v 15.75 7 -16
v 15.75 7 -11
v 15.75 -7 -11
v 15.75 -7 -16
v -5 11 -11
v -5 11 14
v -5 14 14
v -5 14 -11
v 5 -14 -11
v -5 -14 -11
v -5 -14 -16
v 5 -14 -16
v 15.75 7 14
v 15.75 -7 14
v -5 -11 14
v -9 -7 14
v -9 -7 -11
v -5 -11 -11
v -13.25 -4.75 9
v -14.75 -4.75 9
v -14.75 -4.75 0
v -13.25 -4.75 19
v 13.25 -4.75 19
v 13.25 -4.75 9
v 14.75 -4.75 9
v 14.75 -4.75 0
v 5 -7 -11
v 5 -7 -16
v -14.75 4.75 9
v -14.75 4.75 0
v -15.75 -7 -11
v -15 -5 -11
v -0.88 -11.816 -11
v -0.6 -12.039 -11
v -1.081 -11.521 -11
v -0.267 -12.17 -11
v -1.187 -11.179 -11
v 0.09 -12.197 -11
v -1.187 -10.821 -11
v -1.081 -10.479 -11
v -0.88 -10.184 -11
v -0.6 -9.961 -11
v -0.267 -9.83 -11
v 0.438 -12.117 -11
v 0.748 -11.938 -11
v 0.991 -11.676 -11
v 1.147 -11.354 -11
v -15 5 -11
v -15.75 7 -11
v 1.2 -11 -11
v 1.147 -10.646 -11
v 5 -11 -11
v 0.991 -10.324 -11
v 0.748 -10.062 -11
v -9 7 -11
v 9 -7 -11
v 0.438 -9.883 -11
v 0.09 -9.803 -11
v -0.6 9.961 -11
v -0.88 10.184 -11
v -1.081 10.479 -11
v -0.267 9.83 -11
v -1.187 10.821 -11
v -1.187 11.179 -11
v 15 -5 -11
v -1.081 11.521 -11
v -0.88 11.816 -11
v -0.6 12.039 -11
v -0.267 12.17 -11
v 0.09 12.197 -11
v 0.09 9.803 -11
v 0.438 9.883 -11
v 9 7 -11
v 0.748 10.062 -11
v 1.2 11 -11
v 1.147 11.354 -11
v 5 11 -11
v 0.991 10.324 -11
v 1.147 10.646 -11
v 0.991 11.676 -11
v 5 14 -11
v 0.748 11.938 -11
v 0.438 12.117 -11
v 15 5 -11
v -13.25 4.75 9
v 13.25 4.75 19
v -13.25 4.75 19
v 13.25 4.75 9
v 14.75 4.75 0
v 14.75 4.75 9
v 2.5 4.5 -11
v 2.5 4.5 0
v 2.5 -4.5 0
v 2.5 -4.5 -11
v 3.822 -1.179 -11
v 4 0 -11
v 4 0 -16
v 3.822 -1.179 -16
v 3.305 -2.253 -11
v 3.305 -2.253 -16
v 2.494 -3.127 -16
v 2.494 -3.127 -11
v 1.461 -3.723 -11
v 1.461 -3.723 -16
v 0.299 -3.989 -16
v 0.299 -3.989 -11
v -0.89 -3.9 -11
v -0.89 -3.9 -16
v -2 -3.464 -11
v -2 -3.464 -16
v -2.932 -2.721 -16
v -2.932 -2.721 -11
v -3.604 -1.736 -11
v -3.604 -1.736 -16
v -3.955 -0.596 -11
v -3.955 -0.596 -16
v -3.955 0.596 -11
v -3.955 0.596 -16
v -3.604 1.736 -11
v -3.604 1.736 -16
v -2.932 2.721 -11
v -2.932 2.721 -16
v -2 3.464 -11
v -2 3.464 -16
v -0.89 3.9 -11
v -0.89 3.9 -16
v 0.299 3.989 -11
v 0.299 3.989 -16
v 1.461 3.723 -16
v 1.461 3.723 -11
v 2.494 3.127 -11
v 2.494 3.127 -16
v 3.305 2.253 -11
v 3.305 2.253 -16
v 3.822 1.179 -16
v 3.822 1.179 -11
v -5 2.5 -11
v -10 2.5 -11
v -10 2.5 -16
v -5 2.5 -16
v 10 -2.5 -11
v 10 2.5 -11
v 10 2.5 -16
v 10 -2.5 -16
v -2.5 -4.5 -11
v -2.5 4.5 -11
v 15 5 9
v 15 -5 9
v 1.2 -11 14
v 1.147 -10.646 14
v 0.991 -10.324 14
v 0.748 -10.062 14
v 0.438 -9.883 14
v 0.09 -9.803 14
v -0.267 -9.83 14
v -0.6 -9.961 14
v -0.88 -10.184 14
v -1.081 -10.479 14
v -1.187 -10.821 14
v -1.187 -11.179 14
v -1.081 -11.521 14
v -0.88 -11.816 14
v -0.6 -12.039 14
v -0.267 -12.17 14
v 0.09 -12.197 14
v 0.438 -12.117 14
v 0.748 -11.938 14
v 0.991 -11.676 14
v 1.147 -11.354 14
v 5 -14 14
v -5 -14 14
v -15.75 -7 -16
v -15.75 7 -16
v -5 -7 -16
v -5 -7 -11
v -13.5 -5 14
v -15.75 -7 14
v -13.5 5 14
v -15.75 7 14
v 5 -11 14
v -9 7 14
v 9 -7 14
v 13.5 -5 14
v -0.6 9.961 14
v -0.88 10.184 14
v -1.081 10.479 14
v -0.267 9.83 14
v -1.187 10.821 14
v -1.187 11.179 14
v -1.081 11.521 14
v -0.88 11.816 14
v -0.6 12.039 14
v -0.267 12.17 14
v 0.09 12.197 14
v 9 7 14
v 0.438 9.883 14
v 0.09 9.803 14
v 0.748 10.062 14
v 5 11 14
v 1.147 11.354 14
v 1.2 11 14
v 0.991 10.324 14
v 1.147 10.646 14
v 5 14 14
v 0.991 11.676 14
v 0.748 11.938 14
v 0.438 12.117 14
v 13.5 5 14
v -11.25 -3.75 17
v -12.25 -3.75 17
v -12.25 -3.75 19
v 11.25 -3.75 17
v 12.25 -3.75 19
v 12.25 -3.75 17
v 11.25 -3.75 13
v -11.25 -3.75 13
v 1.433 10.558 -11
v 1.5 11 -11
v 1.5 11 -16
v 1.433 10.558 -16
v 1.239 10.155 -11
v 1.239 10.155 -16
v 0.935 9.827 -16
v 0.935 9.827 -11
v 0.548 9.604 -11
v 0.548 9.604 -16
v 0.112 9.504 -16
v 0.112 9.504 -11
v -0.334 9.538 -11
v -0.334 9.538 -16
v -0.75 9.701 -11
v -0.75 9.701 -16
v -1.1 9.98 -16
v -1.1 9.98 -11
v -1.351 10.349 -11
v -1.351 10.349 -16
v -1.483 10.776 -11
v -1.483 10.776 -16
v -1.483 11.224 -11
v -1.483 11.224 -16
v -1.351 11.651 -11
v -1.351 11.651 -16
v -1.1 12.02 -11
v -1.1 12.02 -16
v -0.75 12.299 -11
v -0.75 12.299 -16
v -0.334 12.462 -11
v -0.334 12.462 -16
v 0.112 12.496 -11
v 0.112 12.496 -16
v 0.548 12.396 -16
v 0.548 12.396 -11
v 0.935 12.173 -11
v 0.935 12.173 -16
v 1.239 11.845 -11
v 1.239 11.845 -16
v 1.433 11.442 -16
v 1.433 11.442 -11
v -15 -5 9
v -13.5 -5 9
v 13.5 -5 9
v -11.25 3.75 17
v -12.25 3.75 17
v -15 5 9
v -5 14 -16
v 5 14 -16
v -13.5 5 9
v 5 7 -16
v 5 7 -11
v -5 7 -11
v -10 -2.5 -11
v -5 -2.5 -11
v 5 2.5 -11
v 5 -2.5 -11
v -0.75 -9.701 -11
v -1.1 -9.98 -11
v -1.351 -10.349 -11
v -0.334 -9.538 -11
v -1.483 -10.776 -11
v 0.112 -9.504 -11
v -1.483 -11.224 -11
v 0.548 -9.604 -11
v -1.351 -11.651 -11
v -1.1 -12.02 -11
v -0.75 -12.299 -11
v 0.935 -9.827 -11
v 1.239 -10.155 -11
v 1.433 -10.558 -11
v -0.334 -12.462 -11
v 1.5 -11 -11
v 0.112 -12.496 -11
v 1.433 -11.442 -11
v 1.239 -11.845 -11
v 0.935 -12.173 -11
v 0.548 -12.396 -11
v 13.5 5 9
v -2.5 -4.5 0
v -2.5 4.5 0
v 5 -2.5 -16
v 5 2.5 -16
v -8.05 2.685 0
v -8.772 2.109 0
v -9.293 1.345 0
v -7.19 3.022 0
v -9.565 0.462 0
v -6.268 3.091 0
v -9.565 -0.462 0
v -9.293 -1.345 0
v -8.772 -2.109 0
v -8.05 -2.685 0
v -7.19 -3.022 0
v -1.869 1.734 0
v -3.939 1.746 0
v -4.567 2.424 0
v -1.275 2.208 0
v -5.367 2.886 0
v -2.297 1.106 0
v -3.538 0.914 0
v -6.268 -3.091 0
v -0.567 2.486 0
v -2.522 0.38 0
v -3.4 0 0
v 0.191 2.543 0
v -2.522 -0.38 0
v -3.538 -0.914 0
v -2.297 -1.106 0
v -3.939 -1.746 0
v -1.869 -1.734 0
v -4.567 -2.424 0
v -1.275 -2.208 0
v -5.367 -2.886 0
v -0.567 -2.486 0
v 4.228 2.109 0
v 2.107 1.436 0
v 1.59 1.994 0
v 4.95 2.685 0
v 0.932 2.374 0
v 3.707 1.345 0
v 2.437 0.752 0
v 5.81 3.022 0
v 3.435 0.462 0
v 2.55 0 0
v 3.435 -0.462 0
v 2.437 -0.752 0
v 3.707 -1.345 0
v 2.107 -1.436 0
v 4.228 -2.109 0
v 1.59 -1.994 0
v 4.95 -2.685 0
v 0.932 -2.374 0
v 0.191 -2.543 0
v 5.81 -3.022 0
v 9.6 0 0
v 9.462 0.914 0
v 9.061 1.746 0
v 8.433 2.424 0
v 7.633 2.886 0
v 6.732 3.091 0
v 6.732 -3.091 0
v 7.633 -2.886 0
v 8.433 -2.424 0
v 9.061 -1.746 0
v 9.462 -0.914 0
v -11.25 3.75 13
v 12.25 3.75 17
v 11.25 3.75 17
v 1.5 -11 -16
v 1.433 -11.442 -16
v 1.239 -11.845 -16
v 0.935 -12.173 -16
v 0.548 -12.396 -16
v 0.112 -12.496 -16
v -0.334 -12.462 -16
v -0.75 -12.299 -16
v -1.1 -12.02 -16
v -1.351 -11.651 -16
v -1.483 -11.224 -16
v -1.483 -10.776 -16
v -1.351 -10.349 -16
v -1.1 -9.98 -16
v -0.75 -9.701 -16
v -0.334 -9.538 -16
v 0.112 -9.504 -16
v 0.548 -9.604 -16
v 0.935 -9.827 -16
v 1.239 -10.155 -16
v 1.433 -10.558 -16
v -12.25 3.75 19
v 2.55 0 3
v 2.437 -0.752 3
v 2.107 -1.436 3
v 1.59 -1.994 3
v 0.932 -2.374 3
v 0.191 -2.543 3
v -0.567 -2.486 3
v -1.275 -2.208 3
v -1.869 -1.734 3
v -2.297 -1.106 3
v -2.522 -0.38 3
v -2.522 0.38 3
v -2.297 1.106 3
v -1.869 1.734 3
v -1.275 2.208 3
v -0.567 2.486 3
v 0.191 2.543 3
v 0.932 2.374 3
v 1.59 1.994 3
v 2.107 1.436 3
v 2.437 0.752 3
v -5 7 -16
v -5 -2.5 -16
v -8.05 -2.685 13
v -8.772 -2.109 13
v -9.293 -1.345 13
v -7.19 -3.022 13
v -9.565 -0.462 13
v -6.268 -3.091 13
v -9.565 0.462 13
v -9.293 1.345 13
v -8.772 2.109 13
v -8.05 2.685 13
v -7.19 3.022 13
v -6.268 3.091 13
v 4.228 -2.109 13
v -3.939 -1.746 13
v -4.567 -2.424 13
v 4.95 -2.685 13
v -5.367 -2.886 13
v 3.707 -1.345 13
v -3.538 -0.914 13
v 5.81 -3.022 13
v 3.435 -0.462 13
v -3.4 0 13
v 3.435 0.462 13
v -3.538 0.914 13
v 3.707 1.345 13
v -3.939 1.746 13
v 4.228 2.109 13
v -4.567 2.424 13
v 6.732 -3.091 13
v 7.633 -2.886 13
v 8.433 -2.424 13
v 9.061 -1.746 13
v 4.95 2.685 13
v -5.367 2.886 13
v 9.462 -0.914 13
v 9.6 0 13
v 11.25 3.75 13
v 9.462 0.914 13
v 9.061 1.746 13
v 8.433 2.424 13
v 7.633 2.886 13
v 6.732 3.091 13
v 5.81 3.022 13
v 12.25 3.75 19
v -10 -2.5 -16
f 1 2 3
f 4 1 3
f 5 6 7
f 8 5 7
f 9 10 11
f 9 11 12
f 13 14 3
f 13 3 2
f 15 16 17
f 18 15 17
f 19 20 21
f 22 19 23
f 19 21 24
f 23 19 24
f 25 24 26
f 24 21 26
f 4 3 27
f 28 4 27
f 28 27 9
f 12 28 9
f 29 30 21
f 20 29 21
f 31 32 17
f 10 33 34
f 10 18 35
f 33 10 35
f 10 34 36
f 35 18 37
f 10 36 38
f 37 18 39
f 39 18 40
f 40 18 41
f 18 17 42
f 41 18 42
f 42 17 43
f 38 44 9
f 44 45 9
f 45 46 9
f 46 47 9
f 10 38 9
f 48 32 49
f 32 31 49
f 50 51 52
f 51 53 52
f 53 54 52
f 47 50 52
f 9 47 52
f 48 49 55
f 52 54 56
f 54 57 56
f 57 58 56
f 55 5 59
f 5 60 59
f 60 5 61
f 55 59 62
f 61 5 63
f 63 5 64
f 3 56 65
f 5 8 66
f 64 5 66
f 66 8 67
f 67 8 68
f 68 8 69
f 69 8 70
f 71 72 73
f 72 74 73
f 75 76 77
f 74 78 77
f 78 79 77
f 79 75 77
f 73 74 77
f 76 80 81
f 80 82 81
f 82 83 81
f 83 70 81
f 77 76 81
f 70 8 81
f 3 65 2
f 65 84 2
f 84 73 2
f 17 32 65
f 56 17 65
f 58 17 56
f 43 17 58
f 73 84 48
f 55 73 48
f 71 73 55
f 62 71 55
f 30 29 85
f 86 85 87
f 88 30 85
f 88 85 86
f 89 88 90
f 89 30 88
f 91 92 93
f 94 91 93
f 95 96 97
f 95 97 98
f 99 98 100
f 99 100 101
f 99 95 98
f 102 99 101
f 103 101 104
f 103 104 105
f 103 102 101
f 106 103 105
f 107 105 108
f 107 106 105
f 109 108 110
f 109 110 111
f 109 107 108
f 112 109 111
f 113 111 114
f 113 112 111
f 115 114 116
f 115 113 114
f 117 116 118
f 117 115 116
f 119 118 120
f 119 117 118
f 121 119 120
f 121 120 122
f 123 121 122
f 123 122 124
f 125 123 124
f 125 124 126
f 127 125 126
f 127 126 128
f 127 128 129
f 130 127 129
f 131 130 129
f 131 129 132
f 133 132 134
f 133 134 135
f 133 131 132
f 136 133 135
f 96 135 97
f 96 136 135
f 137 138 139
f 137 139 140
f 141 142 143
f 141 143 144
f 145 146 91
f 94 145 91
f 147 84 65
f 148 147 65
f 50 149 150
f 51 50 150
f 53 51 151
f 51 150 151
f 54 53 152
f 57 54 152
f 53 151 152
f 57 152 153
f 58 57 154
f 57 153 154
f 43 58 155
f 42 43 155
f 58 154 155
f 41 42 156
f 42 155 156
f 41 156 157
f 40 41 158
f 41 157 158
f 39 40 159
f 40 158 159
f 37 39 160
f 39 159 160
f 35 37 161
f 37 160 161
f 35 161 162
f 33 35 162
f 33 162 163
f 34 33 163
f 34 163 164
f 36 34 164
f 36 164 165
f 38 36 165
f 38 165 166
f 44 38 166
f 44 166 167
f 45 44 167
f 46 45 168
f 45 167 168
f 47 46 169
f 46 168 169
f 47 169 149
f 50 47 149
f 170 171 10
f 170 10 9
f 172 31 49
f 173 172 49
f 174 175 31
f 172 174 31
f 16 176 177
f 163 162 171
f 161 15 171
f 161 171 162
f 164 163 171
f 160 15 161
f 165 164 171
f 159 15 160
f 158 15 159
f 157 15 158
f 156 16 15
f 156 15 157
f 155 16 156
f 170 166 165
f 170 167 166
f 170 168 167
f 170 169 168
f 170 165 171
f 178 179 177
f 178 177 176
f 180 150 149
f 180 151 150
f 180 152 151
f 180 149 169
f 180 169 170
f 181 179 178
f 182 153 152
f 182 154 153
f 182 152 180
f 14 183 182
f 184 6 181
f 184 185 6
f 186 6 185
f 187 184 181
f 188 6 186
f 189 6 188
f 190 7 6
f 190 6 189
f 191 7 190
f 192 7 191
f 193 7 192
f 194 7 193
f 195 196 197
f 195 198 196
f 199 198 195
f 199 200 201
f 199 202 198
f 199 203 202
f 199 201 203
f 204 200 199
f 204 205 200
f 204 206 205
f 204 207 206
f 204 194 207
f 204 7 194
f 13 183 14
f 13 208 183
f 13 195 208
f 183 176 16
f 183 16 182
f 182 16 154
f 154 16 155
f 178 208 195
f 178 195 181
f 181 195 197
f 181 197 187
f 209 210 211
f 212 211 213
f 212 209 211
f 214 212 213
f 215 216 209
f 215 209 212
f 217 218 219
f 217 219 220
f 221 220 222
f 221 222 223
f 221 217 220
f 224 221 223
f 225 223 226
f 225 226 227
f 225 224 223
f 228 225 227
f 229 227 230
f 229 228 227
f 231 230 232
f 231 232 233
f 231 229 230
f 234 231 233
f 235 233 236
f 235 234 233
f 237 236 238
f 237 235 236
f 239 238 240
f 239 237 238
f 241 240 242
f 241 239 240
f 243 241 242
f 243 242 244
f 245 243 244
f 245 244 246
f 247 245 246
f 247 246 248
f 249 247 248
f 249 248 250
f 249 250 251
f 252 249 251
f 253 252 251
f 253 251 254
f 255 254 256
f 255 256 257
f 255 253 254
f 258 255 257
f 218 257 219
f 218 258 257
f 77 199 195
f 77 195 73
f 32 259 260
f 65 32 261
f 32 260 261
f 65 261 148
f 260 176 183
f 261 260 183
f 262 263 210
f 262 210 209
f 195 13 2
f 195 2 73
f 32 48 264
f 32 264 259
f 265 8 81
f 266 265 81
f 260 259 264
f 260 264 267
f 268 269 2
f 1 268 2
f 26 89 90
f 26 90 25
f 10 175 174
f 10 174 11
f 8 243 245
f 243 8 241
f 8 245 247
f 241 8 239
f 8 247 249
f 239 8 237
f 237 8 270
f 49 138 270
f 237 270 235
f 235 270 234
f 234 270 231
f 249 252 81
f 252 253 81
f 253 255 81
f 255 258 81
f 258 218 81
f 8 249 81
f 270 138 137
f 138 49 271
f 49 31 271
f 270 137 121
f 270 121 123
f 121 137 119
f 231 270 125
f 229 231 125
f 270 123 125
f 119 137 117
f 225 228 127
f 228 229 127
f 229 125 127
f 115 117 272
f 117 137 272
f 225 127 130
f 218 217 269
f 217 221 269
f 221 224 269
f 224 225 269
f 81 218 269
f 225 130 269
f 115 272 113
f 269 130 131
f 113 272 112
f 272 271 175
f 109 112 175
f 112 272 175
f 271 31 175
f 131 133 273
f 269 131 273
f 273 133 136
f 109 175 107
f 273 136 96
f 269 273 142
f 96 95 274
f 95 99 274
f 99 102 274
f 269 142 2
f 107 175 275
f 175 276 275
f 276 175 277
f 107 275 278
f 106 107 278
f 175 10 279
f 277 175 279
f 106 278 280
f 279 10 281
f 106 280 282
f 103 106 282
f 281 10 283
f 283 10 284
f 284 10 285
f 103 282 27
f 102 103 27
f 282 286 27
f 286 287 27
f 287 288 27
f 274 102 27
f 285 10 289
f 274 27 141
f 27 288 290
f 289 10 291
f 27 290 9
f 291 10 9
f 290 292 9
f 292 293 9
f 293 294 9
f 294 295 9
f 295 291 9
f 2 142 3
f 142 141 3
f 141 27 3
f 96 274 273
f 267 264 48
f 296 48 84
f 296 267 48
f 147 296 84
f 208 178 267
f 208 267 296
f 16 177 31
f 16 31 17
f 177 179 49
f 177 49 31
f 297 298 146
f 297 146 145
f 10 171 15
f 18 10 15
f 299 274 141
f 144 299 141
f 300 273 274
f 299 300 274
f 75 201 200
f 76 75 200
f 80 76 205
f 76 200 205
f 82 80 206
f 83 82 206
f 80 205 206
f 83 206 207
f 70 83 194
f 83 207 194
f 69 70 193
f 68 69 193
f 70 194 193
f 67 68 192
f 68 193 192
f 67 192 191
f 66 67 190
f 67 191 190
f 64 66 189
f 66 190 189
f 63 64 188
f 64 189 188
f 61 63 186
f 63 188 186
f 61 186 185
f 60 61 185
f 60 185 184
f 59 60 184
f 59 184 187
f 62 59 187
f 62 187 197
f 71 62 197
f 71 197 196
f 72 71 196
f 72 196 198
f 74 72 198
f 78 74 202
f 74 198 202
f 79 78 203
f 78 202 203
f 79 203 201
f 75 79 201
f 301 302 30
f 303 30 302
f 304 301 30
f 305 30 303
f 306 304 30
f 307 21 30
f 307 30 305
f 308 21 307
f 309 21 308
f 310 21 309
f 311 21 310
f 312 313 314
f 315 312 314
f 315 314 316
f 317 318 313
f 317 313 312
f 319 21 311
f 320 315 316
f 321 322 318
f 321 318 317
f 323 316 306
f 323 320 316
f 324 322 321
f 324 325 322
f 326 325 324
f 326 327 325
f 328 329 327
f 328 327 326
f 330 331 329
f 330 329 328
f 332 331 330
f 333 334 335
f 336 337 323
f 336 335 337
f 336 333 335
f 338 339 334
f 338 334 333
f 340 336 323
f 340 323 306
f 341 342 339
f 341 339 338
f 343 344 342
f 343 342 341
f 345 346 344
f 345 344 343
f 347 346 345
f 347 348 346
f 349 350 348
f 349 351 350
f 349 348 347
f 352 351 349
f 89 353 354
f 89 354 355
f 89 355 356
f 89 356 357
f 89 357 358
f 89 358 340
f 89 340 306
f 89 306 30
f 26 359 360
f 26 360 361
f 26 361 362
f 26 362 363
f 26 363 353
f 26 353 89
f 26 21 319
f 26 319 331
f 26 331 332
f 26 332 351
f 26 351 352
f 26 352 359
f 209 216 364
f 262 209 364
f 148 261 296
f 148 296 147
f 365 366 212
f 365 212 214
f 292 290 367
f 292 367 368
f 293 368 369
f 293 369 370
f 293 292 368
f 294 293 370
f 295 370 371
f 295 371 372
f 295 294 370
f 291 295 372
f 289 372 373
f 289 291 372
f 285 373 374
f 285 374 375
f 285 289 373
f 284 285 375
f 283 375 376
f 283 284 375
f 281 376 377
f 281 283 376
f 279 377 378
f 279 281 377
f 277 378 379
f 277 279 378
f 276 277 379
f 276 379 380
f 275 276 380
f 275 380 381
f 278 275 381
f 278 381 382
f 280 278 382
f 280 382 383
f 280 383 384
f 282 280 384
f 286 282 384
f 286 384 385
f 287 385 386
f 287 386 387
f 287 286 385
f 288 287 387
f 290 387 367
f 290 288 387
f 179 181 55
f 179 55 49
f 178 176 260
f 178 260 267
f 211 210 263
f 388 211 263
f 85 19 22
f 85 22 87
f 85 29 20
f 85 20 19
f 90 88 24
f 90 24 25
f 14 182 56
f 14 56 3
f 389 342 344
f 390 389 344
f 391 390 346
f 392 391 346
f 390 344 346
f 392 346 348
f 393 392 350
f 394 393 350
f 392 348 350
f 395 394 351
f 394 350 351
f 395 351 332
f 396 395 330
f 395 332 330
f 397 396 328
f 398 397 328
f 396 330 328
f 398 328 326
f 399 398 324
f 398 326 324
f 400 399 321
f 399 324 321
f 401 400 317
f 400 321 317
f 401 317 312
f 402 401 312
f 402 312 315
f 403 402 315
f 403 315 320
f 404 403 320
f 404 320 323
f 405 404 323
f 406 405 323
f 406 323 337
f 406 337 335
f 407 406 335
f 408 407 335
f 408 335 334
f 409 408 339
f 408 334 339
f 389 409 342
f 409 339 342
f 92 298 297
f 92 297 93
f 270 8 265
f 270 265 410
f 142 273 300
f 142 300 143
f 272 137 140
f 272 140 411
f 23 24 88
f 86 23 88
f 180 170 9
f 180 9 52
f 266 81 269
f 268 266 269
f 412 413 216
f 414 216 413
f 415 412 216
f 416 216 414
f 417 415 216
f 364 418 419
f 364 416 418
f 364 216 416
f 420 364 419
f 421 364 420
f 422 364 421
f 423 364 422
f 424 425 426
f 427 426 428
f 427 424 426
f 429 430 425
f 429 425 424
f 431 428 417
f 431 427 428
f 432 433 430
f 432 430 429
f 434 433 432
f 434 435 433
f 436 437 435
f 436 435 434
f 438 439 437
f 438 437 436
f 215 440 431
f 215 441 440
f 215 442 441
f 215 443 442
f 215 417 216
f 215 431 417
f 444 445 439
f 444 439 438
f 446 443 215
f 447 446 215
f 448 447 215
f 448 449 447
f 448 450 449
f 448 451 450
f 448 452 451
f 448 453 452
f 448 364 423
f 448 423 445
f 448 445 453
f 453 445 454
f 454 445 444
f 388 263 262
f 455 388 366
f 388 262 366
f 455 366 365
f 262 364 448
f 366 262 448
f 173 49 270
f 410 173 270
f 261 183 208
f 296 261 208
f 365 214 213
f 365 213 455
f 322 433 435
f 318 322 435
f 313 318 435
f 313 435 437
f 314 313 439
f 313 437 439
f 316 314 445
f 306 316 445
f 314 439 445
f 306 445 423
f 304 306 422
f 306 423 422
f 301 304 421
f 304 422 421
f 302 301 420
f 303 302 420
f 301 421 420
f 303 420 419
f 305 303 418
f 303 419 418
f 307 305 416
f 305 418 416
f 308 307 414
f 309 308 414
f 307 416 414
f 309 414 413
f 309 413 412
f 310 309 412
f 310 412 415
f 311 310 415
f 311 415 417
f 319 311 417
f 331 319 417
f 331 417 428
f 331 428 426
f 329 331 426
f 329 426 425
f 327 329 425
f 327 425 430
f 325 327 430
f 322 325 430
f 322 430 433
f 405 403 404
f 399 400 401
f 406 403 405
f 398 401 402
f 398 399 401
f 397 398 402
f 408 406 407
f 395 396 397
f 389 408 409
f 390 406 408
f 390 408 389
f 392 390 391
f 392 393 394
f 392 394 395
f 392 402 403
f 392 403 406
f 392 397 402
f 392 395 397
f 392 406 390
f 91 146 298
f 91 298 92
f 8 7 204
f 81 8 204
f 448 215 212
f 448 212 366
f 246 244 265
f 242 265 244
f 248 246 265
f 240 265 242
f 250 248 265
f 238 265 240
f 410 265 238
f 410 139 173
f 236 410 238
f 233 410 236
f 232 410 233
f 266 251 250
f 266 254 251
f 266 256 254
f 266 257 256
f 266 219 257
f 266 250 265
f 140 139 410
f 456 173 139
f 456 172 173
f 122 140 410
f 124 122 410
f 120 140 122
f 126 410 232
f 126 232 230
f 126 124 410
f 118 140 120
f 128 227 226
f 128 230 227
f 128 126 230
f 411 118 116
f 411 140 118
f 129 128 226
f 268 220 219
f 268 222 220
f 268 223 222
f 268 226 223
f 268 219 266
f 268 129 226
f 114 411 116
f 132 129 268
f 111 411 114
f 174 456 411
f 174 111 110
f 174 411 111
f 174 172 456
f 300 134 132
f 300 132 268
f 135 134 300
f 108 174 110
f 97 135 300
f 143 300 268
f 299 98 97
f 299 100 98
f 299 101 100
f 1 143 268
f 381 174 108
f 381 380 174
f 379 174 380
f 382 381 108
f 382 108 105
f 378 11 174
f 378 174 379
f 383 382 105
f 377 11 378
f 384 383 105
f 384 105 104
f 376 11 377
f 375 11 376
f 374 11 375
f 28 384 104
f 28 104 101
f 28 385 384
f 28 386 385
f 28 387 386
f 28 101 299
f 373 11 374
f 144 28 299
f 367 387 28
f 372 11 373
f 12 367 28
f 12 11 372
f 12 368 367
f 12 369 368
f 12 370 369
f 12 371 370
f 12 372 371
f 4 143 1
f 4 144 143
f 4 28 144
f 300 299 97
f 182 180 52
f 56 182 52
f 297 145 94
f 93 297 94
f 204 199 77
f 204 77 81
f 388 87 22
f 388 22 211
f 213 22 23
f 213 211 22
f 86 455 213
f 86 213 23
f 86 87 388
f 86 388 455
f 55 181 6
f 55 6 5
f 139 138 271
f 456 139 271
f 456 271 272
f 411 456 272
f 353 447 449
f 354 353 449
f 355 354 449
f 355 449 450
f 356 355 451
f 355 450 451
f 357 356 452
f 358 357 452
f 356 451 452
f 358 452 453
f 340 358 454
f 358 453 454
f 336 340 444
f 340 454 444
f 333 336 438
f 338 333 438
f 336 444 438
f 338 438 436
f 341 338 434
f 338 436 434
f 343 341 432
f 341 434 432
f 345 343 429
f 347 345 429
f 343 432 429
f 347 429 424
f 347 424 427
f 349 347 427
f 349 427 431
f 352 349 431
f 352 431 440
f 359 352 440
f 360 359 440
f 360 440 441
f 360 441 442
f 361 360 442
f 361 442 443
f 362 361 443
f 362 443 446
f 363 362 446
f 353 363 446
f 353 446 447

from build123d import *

# Parameters (mm, degrees)
F0_W      = 26.5
F0_H      = 9.5
F1_DEPTH  = 13
F2_W      = 26.5
F2_H      = 9.5
F2_W_2    = 24.5
F2_H_2    = 7.5
F3_DEPTH  = 6
F4_W      = 1
F4_H      = 7.5
F5_DEPTH  = 4
F6_R      = 3.1
F7_DEPTH  = 19
F8_W      = 1.5
F8_H      = 9.5
F9_DEPTH  = 9
F10_R     = 2.55
F11_DEPTH = 3
F13_W     = 27
F13_H     = 10
F13_W_2   = 10
F13_H_2   = 7
F14_DEPTH = 25
F15_W     = 30
F15_H     = 10
F16_DEPTH = 20
F17_R     = 1.2
F18_DEPTH = 25
F19_W     = 5
F19_H     = 5
F19_R     = 4
F19_W_2   = 10
F19_H_2   = 7
F19_R_2   = 1.5
F20_DEPTH = 5
F21_SIZE  = 4
F23_W     = 5
F23_H     = 9
F24_DEPTH = 11


with BuildPart() as f1:
    # F0 (on Top) → F1 (new body)
    with BuildSketch(Plane.XY):
        Rectangle(F0_W, F0_H)
    extrude(amount=F1_DEPTH)

    # F2 (on face) → F3 (join)
    with BuildSketch(Plane.XY.offset(13)):
        Rectangle(F2_W, F2_H)
        Rectangle(F2_W_2, F2_H_2, mode=Mode.SUBTRACT)
    extrude(amount=F3_DEPTH)

    # F4 (on face) → F5 (join)
    with BuildSketch(Plane.XY.offset(13)):
        with Locations((-11.75, 0)):
            Rectangle(F4_W, F4_H)
        with Locations((11.75, 0)):
            Rectangle(F4_W, F4_H)
    extrude(amount=F5_DEPTH)

    # F6 (on face) → F7 (cut)
    with BuildSketch(Plane.XY.offset(13)):
        with Locations((-6.5, 0)):
            Circle(F6_R)
        with Locations((6.5, 0)):
            Circle(F6_R)
    extrude(amount=-F7_DEPTH, mode=Mode.SUBTRACT)

    # F8 (on face) → F9 (join)
    with BuildSketch(Plane(origin=(0, 0, 0), x_dir=(1, 0, 0), z_dir=(0, 0, -1))):
        with Locations((-14, 0)):
            Rectangle(F8_W, F8_H)
        with Locations((14, 0)):
            Rectangle(F8_W, F8_H)
    extrude(amount=-F9_DEPTH)

    # F10 (on face) → F11 (cut)
    with BuildSketch(Plane(origin=(0, 0, 0), x_dir=(1, 0, 0), z_dir=(0, 0, -1))):
        Circle(F10_R)
    extrude(amount=-F11_DEPTH, mode=Mode.SUBTRACT)


with BuildPart() as f14:
    # F13 (on offset) → F14 (new body)
    with BuildSketch(Plane.XY.offset(14)):
        Polygon((5, -7), (15.75, -7), (15.75, 7), (5, 7), (-5, 7), (-15.75, 7), (-15.75, -7), (-5, -7), align=None)
        Rectangle(F13_W, F13_H, mode=Mode.SUBTRACT)
        with Locations((0, -10.5)):
            Rectangle(F13_W_2, F13_H_2)
        with Locations((0, 10.5)):
            Rectangle(F13_W_2, F13_H_2)
    extrude(amount=-F14_DEPTH)

    # F15 (on face) → F16 (cut)
    with BuildSketch(Plane(origin=(0, 0, -11), x_dir=(1, 0, 0), z_dir=(0, 0, -1))):
        Rectangle(F15_W, F15_H)
    extrude(amount=-F16_DEPTH, mode=Mode.SUBTRACT)

    # F17 (on face) → F18 (cut)
    with BuildSketch(Plane.XY.offset(14)):
        with Locations((0, 11)):
            Circle(F17_R)
        with Locations((0, -11)):
            Circle(F17_R)
    extrude(amount=-F18_DEPTH, mode=Mode.SUBTRACT)

    # F21
    f21_edges = [f14.edges().sort_by_distance(p)[0] for p in [
        (-5, 7, 1.5),
        (5, 7, 1.5),
        (5, -7, 1.5),
        (-5, -7, 1.5),
    ]]
    chamfer(f21_edges, length=F21_SIZE)


with BuildPart() as f20:
    # F19 (on face) → F20 (new body)
    with BuildSketch(Plane(origin=(0, 0, -11), x_dir=(1, 0, 0), z_dir=(0, 0, -1))):
        Polygon((5, -7), (15.75, -7), (15.75, 7), (5, 7), (-5, 7), (-15.75, 7), (-15.75, -7), (-5, -7), align=None)
        with Locations((-7.5, 0)):
            Rectangle(F19_W, F19_H, mode=Mode.SUBTRACT)
        Circle(F19_R, mode=Mode.SUBTRACT)
        with Locations((7.5, 0)):
            Rectangle(F19_W, F19_H, mode=Mode.SUBTRACT)
        with Locations((0, -10.5)):
            Rectangle(F19_W_2, F19_H_2)
        with Locations((0, -11)):
            Circle(F19_R_2, mode=Mode.SUBTRACT)
        with Locations((0, 10.5)):
            Rectangle(F19_W_2, F19_H_2)
        with Locations((0, 11)):
            Circle(F19_R_2, mode=Mode.SUBTRACT)
    extrude(amount=F20_DEPTH)


with BuildPart() as f24:
    # F23 (on offset) → F24 (new body)
    with BuildSketch(Plane(origin=(0, 0, -11), x_dir=(1, 0, 0), z_dir=(0, 0, -1))):
        Rectangle(F23_W, F23_H)
    extrude(amount=-F24_DEPTH)


solid = Compound([f1.part, f14.part, f20.part, f24.part])
